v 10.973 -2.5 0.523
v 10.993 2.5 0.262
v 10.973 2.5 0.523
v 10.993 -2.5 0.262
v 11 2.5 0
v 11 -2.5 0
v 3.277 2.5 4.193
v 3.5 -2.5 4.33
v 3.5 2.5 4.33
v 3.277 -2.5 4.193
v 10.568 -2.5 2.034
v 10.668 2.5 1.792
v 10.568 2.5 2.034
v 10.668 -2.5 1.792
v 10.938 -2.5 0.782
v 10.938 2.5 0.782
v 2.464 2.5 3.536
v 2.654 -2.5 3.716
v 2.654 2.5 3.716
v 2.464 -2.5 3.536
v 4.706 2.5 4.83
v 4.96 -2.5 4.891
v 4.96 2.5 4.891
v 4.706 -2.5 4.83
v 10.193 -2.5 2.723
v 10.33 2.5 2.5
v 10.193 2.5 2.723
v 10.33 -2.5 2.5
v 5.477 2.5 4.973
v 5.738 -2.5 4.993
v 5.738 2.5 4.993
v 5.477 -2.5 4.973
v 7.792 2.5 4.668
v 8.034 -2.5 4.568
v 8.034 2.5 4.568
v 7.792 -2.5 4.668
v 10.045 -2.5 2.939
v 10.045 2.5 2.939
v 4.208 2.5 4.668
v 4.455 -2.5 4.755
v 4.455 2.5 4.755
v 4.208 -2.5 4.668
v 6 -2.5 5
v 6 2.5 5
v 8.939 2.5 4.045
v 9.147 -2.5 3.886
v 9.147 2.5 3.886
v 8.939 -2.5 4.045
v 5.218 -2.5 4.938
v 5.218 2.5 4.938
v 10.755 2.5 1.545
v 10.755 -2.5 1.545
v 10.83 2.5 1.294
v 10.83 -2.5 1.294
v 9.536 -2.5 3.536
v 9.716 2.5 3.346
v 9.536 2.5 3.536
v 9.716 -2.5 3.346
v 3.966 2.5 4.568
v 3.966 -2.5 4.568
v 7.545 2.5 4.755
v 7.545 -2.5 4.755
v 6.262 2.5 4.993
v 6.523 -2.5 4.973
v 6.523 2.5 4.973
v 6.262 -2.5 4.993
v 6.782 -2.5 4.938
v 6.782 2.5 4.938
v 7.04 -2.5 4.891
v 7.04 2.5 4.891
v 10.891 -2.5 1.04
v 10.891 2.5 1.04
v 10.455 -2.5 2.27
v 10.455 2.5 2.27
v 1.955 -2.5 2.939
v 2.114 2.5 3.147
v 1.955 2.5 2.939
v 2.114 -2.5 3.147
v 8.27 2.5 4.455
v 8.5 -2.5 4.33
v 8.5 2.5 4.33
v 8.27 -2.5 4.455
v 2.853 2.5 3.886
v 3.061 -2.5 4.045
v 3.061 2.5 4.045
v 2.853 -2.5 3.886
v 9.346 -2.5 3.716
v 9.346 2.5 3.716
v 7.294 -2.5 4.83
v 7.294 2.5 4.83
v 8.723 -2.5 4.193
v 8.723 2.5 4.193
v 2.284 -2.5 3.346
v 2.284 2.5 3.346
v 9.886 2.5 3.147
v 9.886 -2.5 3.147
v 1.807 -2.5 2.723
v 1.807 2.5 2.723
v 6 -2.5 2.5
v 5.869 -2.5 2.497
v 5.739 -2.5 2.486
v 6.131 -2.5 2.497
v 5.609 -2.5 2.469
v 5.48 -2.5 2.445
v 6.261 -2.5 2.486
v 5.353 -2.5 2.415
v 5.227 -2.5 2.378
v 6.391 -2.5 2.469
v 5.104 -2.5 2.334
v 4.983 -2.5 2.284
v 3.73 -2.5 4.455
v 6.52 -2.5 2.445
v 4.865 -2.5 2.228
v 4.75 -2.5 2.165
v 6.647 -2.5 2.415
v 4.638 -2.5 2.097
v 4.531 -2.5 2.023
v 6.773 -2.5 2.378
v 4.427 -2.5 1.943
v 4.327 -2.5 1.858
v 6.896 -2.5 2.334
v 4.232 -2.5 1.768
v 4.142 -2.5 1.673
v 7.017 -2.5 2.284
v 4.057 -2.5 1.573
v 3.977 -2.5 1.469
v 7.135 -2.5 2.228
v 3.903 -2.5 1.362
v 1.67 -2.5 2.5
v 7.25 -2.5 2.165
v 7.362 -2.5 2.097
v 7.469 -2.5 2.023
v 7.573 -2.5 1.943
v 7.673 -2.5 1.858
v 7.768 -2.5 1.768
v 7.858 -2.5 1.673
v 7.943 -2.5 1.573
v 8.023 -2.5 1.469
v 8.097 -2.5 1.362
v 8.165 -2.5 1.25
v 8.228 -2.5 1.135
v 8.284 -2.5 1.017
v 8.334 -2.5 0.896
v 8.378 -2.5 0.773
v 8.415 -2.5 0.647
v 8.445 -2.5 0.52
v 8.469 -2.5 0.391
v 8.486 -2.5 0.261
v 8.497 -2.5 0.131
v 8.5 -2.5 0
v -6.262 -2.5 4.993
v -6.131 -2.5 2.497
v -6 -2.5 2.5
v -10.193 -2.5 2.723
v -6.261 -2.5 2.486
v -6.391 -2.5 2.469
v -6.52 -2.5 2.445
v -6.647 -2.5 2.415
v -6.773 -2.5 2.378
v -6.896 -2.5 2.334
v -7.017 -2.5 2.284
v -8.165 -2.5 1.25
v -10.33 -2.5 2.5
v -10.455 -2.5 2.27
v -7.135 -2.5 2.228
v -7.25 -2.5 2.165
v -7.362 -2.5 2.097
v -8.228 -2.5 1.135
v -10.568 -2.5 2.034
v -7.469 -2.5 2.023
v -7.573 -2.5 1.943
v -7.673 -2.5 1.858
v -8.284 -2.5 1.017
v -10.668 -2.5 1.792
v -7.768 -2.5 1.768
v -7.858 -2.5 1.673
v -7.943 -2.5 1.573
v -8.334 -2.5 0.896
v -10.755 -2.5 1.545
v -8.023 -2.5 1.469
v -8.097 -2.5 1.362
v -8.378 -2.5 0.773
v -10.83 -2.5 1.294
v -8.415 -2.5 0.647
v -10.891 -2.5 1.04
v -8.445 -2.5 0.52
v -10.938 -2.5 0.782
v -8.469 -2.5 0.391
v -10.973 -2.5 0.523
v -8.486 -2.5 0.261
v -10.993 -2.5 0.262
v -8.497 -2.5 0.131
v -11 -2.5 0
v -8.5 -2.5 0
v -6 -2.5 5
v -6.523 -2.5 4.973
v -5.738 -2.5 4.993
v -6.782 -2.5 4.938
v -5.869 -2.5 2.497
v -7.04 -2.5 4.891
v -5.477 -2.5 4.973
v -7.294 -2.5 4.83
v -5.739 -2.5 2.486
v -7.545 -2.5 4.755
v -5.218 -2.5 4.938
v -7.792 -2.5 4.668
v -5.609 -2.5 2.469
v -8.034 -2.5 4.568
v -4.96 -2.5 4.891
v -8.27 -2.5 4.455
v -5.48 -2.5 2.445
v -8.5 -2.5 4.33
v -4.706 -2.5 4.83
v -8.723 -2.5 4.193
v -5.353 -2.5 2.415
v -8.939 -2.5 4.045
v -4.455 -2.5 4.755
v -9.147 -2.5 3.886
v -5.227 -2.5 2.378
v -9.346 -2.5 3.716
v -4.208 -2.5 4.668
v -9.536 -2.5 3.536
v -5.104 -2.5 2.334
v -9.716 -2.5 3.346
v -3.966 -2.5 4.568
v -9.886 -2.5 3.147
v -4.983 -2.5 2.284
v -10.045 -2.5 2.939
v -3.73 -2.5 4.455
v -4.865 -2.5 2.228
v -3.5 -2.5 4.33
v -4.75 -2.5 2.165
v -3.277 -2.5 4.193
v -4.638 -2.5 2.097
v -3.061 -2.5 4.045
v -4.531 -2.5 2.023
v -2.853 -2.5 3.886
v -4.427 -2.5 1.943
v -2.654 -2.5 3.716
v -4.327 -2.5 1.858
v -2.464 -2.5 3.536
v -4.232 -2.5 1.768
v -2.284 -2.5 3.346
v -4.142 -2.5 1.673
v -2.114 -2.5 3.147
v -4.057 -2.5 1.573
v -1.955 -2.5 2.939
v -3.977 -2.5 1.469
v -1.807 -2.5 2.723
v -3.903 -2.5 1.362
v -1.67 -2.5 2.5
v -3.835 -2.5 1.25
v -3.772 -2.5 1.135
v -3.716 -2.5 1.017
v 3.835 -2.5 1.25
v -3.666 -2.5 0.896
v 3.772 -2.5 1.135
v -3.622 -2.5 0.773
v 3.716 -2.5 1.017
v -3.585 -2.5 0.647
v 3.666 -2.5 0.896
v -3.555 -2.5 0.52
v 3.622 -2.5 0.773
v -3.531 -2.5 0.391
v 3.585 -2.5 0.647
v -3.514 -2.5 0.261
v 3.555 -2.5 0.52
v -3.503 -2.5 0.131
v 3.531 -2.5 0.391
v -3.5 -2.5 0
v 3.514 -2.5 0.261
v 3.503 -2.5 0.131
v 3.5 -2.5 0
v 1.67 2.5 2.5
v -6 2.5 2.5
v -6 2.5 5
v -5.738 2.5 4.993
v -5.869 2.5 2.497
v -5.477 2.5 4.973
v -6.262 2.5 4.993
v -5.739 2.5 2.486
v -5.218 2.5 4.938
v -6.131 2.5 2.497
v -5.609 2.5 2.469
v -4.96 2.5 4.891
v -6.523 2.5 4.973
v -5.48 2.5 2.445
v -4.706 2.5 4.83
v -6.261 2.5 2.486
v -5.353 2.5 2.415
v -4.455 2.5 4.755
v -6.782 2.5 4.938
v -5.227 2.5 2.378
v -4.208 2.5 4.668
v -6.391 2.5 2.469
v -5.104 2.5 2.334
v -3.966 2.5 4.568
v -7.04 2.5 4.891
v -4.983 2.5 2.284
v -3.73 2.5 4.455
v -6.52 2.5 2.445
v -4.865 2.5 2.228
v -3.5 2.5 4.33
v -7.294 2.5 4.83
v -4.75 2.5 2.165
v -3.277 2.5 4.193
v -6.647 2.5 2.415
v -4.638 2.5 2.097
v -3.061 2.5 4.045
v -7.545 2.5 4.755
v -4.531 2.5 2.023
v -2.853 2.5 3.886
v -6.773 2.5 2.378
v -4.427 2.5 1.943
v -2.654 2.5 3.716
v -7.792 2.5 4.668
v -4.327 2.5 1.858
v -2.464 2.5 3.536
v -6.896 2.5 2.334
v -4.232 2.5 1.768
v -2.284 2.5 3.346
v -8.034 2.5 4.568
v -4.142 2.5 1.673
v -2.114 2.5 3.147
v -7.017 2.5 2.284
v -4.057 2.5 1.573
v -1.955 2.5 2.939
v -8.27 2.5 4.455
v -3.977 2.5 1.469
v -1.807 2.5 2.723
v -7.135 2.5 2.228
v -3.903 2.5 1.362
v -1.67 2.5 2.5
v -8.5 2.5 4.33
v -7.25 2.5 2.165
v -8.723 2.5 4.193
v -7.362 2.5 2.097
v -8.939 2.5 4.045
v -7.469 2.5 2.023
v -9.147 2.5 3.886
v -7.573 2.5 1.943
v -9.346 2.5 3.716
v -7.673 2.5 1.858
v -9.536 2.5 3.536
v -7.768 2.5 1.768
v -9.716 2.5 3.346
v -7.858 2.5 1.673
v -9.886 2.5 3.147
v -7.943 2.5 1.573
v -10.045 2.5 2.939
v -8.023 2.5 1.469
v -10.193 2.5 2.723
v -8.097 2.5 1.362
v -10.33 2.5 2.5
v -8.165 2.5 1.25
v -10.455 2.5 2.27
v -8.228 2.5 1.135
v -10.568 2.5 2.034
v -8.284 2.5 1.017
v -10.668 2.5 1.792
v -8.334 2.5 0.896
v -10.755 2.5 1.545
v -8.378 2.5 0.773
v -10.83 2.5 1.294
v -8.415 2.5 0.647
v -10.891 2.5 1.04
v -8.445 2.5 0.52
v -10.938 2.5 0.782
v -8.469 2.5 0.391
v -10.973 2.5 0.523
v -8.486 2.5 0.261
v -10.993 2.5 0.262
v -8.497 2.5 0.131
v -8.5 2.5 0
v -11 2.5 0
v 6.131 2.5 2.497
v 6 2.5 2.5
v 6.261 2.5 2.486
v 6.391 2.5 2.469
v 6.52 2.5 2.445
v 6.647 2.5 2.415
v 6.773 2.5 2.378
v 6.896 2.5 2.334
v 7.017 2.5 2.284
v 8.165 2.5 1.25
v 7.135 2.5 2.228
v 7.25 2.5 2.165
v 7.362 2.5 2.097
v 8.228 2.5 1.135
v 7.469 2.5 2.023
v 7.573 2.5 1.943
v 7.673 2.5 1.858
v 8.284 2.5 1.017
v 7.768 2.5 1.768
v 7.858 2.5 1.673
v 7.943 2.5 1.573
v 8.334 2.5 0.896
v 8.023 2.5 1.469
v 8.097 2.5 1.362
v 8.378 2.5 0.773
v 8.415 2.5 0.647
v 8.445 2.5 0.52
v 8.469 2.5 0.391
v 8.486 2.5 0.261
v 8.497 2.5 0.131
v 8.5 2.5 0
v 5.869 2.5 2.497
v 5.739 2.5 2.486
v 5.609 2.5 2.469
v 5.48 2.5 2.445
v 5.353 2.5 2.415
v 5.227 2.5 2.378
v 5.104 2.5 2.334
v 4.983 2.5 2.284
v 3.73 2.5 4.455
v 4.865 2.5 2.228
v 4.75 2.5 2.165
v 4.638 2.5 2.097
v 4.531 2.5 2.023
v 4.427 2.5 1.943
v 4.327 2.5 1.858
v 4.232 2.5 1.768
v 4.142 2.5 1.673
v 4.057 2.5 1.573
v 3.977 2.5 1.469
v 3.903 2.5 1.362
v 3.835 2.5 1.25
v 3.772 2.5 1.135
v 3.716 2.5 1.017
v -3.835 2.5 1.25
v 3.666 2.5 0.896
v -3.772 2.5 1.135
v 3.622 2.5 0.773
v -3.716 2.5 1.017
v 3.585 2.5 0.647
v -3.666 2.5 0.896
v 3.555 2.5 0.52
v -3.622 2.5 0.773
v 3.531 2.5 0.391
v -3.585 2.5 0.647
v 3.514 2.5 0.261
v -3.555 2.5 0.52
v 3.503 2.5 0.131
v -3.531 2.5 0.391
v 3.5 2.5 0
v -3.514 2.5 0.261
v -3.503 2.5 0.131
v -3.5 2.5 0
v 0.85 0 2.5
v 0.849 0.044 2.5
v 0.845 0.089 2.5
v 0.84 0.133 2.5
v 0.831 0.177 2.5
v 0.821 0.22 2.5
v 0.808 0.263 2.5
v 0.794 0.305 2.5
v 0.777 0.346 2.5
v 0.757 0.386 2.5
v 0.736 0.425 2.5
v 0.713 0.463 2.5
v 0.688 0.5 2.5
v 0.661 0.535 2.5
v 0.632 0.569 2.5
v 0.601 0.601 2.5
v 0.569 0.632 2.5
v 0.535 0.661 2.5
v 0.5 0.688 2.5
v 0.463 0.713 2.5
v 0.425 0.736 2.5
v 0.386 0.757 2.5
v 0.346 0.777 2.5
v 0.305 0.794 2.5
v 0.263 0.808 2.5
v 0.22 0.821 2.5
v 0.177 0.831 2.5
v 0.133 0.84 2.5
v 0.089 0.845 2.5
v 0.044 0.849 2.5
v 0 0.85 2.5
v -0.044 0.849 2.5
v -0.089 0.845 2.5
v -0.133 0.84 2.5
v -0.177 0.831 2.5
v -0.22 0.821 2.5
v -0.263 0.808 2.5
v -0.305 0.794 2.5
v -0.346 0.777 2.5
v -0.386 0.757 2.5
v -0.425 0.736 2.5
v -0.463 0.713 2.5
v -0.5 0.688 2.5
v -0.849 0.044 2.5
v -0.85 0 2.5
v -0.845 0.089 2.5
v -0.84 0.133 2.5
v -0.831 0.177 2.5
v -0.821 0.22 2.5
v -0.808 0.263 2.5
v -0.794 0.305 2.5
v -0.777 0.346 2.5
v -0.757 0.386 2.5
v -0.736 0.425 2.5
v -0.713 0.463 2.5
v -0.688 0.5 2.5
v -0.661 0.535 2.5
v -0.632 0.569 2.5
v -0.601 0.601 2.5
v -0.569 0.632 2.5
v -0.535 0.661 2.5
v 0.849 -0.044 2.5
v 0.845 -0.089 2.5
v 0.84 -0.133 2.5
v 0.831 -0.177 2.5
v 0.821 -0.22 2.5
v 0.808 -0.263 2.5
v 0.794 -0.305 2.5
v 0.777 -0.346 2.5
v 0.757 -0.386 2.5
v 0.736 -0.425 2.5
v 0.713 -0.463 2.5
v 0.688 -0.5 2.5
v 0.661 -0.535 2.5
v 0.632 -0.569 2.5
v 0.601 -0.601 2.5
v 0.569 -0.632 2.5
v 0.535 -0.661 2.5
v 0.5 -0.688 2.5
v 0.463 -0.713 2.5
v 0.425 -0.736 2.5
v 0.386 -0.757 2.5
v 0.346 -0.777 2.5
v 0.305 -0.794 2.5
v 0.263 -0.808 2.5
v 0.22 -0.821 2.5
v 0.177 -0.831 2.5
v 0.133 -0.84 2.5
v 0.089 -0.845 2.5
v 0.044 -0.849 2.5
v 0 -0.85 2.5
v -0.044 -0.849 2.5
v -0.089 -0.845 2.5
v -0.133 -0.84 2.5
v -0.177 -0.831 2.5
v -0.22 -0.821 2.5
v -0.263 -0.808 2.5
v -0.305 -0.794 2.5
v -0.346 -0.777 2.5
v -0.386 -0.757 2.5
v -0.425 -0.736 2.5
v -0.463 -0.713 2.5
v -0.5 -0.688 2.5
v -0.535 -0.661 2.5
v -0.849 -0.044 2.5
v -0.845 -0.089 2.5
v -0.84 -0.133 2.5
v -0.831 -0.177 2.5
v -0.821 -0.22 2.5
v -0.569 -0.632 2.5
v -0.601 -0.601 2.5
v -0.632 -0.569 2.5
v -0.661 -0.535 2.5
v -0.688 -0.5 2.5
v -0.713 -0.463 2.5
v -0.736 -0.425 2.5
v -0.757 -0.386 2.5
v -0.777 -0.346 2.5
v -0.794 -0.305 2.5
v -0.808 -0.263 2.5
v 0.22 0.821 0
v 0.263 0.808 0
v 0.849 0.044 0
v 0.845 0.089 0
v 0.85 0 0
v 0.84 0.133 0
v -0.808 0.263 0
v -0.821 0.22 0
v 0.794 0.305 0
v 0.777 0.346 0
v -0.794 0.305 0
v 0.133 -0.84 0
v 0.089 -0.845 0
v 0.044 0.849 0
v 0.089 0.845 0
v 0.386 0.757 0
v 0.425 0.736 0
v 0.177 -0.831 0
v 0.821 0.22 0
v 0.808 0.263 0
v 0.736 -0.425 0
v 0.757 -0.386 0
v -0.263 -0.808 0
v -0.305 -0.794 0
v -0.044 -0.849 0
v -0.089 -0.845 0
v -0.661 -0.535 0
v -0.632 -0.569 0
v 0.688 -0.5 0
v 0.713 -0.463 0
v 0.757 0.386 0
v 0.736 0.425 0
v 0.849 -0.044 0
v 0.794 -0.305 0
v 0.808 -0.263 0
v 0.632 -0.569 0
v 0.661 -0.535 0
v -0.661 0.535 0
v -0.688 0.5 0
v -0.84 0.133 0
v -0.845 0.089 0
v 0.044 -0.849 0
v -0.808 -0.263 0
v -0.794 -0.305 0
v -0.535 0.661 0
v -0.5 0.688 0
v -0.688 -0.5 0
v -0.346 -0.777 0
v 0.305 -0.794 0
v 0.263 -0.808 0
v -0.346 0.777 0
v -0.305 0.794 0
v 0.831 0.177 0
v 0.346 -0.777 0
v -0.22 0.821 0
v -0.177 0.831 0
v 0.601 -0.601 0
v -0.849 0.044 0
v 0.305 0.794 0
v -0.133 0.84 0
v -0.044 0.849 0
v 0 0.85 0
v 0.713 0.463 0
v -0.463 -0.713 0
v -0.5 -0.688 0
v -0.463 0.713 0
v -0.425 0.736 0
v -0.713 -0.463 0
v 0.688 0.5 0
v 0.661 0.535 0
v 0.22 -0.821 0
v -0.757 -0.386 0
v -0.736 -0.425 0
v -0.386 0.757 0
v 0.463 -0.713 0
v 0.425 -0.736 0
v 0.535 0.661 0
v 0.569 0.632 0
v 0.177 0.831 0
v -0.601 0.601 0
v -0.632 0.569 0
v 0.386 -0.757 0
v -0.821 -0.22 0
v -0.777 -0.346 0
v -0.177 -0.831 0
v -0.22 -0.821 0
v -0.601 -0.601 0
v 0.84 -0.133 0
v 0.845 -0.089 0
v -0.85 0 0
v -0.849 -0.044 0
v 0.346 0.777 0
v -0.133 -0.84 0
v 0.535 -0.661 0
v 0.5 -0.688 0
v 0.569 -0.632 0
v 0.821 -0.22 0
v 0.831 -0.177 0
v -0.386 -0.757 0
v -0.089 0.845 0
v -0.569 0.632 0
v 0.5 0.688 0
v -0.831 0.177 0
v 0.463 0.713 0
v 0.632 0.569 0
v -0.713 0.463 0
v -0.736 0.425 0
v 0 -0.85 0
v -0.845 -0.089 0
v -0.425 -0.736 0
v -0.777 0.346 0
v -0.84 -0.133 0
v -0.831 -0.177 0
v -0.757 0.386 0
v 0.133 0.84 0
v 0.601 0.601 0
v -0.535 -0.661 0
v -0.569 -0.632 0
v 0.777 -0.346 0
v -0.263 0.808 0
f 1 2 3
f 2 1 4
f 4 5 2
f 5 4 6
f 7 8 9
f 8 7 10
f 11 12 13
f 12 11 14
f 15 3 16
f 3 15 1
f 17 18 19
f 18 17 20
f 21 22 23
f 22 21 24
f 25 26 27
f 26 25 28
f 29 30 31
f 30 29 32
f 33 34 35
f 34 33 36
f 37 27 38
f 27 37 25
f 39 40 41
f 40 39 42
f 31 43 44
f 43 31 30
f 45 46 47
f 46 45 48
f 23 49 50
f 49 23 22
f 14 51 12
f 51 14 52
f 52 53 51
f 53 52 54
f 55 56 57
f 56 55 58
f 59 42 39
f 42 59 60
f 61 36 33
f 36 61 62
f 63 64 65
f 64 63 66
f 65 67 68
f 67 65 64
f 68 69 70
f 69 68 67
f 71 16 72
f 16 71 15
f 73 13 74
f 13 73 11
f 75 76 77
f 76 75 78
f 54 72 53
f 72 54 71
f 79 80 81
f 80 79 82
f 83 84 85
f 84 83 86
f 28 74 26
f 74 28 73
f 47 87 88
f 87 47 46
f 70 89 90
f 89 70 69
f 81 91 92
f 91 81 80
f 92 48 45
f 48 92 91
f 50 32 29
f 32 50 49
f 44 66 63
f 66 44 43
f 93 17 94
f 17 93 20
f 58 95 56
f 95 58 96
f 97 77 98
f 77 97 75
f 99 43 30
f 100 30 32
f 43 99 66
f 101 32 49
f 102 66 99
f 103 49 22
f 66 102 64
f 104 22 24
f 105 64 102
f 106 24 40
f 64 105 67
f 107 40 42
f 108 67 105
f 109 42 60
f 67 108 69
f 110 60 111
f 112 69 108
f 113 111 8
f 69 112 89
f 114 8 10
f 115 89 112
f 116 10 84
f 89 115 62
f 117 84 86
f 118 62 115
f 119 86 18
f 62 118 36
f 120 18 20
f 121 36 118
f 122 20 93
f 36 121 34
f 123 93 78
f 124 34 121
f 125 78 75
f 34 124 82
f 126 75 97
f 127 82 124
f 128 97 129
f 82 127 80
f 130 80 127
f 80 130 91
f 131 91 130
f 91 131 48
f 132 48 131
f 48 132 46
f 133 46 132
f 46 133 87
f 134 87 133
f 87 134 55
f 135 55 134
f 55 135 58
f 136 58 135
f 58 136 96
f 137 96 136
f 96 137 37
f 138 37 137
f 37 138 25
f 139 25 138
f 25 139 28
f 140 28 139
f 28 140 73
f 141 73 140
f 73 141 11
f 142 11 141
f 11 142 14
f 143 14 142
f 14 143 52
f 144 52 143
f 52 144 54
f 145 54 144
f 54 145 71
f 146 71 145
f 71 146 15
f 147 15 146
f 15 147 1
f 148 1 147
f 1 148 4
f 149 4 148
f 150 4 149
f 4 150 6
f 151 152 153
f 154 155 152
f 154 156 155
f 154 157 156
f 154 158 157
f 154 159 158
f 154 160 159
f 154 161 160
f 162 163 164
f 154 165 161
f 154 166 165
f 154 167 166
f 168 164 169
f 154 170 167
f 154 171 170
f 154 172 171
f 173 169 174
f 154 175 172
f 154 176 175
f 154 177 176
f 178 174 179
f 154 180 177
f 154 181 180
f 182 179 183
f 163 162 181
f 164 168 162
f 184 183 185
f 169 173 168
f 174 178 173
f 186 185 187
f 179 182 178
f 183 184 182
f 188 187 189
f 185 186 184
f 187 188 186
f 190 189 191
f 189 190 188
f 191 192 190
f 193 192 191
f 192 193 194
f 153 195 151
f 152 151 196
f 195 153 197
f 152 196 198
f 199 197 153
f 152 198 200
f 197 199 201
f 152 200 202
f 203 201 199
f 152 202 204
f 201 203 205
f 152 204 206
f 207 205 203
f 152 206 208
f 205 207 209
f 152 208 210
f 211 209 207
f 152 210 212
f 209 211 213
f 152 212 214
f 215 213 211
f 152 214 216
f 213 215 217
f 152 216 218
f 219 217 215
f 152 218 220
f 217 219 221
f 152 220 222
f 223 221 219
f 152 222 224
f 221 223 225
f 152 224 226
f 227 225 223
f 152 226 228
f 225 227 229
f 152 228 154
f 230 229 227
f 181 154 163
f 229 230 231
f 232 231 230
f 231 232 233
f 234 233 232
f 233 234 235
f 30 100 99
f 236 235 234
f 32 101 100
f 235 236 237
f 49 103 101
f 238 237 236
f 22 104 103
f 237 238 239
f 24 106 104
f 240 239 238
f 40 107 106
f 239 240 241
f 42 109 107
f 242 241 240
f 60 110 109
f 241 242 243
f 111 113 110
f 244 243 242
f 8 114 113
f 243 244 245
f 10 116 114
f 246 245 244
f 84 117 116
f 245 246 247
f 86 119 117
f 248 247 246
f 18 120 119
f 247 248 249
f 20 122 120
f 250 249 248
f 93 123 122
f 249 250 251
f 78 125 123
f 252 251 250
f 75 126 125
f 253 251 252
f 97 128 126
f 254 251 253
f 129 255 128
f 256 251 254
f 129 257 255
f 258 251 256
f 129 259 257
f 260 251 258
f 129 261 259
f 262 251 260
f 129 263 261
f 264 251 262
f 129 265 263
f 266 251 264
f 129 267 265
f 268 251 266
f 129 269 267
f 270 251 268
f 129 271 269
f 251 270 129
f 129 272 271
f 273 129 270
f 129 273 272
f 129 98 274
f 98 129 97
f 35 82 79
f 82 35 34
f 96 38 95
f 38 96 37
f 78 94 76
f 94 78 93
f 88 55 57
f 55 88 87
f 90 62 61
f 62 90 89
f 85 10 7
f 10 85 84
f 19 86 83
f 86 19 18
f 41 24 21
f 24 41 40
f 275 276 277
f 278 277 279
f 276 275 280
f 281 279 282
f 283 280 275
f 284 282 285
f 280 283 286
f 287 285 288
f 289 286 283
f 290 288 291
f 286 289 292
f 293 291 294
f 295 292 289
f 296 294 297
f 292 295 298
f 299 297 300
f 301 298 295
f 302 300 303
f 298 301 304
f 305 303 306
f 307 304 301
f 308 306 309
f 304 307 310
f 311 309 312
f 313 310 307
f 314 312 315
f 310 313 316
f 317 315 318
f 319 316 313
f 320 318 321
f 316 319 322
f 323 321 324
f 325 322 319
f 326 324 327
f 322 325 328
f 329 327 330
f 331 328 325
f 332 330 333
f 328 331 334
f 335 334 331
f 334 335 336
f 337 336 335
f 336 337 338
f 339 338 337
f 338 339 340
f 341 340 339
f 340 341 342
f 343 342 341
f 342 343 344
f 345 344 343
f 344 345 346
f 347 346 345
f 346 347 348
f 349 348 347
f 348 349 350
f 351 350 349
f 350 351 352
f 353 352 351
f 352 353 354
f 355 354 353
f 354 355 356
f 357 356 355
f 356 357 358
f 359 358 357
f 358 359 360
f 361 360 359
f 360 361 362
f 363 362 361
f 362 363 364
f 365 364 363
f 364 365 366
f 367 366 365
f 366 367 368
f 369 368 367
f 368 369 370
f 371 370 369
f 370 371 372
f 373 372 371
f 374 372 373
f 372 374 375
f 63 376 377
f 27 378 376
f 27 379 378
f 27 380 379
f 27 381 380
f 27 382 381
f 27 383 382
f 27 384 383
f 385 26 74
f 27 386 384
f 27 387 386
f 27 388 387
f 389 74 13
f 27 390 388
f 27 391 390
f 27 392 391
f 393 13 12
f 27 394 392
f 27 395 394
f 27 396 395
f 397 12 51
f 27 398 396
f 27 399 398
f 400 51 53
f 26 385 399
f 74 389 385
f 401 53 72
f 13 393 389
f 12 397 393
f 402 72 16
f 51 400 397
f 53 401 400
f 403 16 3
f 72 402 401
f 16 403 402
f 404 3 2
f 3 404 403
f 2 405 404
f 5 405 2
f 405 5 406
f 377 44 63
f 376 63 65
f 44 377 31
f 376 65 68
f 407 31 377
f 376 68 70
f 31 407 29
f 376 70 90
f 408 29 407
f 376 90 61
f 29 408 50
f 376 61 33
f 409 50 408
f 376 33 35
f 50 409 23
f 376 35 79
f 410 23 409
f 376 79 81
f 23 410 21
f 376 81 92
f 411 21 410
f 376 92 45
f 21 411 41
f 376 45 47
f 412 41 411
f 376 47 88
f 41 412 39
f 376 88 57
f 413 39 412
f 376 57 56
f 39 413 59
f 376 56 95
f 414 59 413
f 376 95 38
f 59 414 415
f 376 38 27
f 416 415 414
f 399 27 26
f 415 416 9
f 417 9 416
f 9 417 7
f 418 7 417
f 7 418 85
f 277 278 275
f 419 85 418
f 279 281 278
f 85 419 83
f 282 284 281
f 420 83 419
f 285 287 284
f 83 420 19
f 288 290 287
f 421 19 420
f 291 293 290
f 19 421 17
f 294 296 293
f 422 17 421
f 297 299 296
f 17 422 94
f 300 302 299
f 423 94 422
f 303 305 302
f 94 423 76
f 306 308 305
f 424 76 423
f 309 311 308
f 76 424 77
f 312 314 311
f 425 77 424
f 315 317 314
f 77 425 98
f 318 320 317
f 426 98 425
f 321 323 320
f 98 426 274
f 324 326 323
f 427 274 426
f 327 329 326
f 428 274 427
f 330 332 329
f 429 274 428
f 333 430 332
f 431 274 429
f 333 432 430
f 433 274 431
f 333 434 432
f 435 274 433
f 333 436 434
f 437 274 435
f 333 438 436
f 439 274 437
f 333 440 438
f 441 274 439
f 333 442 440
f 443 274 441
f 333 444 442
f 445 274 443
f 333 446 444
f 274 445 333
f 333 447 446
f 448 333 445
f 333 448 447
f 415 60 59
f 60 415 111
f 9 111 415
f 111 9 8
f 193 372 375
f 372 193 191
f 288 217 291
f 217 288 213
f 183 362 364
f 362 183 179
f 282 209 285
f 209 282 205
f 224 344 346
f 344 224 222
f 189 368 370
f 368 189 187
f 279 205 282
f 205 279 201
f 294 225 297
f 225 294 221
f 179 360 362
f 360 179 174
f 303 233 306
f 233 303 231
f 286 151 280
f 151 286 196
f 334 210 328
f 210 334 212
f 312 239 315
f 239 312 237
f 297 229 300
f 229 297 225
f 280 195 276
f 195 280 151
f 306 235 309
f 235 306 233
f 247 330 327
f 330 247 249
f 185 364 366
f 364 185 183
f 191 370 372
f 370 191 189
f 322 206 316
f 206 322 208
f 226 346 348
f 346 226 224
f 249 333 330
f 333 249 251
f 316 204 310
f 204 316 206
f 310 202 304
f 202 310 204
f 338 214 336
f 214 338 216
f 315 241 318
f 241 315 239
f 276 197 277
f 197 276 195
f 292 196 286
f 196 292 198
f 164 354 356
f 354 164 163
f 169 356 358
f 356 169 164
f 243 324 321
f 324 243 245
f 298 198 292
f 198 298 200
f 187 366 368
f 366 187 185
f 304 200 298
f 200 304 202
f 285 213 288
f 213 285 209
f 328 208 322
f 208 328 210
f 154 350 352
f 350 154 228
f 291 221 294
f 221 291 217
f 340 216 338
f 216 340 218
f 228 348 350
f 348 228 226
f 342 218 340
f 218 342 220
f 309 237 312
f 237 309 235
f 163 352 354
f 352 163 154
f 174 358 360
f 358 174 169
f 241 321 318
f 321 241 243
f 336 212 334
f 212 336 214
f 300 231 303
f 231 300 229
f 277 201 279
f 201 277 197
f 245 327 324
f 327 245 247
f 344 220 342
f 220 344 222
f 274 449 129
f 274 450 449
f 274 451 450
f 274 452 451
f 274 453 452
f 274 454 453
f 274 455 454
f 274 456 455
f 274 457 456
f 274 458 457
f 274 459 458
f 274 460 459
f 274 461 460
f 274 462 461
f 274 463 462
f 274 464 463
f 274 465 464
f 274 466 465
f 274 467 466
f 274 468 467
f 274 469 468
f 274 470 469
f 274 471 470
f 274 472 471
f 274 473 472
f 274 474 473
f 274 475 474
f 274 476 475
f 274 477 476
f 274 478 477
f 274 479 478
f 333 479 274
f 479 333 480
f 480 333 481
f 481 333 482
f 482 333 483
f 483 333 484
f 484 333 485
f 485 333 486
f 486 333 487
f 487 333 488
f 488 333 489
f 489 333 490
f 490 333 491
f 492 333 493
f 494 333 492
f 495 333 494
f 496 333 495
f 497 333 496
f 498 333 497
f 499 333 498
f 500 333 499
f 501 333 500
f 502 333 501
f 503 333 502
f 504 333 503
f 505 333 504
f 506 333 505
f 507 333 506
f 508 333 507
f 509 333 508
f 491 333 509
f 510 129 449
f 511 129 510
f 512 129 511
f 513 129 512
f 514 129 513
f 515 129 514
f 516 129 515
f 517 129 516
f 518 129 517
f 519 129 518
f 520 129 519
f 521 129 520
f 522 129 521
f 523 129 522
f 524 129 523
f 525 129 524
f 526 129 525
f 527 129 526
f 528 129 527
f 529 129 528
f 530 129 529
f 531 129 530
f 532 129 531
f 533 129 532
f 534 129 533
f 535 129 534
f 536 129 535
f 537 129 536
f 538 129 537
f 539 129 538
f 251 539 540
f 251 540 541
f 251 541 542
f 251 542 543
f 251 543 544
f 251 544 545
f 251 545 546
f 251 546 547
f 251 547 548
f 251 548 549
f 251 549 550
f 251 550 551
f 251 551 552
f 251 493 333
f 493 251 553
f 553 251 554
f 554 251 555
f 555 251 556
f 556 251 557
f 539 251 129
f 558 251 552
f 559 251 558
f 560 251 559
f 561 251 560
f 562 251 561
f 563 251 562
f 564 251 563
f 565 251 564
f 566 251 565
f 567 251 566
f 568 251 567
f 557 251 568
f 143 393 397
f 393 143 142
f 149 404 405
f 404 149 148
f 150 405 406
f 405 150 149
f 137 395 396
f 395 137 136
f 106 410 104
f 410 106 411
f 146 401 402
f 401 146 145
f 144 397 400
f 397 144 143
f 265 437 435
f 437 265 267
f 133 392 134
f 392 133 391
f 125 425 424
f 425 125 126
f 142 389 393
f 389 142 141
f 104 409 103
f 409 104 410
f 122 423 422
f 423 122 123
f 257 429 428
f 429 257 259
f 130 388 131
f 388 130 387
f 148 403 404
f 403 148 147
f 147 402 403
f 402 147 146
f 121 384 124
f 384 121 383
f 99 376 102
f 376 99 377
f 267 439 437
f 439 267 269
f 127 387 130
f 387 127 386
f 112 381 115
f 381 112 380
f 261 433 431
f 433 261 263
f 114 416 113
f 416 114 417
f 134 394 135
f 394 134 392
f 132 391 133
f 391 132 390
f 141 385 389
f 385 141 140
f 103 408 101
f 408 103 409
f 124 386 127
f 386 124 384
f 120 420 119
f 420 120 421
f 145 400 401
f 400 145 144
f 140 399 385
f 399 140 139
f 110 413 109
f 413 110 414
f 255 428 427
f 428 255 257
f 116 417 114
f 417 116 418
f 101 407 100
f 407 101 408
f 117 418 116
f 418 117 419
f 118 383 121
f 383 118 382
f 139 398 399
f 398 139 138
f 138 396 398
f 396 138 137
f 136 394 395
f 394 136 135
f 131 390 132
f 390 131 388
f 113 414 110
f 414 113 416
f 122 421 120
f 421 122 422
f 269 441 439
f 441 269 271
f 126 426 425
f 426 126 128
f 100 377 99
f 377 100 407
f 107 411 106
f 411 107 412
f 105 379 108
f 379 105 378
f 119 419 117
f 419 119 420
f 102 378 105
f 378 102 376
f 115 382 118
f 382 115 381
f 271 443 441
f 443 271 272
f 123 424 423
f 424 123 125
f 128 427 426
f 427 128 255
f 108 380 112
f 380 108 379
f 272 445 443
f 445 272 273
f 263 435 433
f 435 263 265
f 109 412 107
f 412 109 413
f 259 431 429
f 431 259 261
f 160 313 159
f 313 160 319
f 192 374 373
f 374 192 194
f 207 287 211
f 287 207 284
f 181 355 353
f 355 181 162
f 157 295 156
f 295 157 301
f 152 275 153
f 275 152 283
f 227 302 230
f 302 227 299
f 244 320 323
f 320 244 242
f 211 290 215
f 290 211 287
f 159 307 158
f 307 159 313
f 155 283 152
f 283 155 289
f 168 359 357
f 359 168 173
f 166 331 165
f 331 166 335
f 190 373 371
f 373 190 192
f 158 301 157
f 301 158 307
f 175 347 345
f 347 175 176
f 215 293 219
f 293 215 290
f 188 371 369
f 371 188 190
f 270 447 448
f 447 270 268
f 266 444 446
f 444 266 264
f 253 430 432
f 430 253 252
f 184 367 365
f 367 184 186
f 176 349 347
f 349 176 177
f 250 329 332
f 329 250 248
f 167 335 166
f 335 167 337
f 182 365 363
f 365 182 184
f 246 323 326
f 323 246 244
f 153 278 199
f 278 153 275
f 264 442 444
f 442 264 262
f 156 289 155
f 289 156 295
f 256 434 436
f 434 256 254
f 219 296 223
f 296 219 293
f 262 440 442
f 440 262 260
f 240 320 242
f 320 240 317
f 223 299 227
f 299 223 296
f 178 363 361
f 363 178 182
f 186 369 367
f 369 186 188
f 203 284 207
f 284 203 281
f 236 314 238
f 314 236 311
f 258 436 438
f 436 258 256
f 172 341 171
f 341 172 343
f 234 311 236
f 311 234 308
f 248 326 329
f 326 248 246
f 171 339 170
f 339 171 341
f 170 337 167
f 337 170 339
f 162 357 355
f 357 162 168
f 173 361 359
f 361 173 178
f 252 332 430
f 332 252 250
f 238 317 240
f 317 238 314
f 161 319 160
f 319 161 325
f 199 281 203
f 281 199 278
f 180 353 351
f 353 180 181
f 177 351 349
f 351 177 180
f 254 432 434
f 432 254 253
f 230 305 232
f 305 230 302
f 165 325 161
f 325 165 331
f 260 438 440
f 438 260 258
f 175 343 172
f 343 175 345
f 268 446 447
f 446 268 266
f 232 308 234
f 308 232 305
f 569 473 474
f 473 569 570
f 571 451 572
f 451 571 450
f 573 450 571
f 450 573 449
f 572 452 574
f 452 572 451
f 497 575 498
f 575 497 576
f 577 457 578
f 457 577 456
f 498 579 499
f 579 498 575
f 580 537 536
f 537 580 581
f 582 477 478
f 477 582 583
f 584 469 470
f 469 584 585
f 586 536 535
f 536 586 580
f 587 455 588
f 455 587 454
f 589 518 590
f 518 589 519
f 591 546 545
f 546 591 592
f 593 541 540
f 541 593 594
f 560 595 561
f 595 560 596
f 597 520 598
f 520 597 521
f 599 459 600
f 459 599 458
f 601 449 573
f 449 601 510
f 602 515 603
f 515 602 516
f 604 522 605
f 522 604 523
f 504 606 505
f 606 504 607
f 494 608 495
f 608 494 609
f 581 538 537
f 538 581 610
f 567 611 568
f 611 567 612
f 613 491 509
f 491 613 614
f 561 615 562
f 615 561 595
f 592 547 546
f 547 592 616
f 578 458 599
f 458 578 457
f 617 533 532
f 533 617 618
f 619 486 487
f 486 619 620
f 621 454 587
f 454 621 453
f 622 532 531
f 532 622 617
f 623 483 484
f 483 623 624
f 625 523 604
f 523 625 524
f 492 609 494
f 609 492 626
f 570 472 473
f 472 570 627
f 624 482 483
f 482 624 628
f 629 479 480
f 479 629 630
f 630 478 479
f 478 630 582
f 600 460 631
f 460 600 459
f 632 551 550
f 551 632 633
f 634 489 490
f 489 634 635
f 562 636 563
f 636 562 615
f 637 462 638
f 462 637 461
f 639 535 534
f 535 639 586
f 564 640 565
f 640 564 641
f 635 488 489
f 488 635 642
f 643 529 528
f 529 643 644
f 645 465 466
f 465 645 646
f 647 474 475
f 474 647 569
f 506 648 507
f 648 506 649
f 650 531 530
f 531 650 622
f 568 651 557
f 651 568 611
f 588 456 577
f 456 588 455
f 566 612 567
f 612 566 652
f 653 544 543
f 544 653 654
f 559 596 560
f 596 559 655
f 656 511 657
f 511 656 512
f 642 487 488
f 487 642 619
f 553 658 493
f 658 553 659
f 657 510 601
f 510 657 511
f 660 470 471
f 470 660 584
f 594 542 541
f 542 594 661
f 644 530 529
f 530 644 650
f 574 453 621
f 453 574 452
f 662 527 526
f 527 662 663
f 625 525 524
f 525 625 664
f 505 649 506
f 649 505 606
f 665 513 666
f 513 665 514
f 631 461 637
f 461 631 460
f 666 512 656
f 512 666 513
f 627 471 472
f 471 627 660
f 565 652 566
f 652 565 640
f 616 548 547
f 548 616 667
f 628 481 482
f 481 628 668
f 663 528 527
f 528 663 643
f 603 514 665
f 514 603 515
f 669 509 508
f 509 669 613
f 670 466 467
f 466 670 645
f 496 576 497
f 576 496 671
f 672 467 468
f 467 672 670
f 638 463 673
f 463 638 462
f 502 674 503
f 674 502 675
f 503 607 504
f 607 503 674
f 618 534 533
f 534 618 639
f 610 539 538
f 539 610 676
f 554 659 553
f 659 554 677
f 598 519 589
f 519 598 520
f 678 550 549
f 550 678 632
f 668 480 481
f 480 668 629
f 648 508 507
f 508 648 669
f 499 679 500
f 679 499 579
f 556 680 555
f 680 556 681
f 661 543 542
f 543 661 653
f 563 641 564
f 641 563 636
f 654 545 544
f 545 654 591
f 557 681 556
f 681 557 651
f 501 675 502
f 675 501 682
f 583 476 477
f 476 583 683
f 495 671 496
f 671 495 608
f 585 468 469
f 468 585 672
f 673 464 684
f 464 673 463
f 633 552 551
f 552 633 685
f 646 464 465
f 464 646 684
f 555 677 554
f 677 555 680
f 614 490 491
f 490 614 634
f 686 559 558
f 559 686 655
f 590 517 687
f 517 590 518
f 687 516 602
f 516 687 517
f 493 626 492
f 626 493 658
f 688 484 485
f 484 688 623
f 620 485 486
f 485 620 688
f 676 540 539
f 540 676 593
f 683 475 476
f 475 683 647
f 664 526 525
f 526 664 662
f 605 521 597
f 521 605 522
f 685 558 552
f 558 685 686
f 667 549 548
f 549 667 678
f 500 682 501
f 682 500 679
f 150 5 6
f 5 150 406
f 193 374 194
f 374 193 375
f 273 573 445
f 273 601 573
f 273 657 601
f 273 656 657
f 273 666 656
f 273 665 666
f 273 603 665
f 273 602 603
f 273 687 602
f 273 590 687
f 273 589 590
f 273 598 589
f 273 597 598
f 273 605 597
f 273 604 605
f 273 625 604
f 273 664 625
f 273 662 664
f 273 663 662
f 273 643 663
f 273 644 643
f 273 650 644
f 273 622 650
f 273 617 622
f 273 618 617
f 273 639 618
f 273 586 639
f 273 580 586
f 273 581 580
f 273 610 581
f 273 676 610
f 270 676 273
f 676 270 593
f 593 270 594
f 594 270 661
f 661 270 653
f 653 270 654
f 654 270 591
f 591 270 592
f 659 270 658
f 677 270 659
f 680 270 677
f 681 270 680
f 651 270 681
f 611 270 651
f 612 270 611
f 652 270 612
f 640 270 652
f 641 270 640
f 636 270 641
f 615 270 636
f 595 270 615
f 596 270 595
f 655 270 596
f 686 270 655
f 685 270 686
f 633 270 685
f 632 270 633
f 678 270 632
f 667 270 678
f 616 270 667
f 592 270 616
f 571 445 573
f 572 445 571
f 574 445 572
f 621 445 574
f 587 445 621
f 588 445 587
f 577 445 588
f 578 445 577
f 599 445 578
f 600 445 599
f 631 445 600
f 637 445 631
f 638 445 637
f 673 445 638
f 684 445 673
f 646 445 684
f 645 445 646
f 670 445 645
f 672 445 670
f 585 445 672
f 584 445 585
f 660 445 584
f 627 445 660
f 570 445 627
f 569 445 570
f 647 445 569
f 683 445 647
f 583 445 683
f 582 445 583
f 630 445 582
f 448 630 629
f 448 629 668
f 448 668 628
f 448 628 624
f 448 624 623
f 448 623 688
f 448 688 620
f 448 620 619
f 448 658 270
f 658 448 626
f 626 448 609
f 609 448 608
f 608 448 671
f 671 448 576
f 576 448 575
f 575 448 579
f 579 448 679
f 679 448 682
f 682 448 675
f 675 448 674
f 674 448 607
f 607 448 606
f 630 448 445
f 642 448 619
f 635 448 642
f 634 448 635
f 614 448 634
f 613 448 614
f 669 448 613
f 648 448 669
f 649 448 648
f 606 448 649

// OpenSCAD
module  minkowski_square(dimension, r=2)
{
    minkowski()
    {
        square([dimension.x-r*2,dimension.y-r*2], center=true);
        circle(r=r);
    }
}
module line_taper(r=5,l=5)
{
    //translate([-r/2,0,r])
    rotate([0,90,180])
    translate([-r,-r,-l/2])
    difference(){
        cube([r,r,l]);
        translate([0,0,-0.01])
        cylinder(r=r,h=l+0.02);
    }
}
module inner_cable_fixer()
{
    difference(){
        union(){
            linear_extrude(height=5,center=true)
            minkowski_square([20,5]);
            
            for(i=[0,1])
                mirror([i,0])
                translate([6,0,0])
                rotate([90,0,0])
                cylinder(r=10/2, h=5, center=true);
        }
        for(i=[0,1])
            mirror([i,0])
            translate([6,0,0])
            rotate([90,0,0])
            cylinder(r=5/2, h=100, center=true);
        
        cylinder(r=1.7/2, h=100, center=true);
    }
}

$fn=120;

difference(){
    inner_cable_fixer();
    translate([0,0,-100/2])
    cube([100,100,100], center=true);
}
